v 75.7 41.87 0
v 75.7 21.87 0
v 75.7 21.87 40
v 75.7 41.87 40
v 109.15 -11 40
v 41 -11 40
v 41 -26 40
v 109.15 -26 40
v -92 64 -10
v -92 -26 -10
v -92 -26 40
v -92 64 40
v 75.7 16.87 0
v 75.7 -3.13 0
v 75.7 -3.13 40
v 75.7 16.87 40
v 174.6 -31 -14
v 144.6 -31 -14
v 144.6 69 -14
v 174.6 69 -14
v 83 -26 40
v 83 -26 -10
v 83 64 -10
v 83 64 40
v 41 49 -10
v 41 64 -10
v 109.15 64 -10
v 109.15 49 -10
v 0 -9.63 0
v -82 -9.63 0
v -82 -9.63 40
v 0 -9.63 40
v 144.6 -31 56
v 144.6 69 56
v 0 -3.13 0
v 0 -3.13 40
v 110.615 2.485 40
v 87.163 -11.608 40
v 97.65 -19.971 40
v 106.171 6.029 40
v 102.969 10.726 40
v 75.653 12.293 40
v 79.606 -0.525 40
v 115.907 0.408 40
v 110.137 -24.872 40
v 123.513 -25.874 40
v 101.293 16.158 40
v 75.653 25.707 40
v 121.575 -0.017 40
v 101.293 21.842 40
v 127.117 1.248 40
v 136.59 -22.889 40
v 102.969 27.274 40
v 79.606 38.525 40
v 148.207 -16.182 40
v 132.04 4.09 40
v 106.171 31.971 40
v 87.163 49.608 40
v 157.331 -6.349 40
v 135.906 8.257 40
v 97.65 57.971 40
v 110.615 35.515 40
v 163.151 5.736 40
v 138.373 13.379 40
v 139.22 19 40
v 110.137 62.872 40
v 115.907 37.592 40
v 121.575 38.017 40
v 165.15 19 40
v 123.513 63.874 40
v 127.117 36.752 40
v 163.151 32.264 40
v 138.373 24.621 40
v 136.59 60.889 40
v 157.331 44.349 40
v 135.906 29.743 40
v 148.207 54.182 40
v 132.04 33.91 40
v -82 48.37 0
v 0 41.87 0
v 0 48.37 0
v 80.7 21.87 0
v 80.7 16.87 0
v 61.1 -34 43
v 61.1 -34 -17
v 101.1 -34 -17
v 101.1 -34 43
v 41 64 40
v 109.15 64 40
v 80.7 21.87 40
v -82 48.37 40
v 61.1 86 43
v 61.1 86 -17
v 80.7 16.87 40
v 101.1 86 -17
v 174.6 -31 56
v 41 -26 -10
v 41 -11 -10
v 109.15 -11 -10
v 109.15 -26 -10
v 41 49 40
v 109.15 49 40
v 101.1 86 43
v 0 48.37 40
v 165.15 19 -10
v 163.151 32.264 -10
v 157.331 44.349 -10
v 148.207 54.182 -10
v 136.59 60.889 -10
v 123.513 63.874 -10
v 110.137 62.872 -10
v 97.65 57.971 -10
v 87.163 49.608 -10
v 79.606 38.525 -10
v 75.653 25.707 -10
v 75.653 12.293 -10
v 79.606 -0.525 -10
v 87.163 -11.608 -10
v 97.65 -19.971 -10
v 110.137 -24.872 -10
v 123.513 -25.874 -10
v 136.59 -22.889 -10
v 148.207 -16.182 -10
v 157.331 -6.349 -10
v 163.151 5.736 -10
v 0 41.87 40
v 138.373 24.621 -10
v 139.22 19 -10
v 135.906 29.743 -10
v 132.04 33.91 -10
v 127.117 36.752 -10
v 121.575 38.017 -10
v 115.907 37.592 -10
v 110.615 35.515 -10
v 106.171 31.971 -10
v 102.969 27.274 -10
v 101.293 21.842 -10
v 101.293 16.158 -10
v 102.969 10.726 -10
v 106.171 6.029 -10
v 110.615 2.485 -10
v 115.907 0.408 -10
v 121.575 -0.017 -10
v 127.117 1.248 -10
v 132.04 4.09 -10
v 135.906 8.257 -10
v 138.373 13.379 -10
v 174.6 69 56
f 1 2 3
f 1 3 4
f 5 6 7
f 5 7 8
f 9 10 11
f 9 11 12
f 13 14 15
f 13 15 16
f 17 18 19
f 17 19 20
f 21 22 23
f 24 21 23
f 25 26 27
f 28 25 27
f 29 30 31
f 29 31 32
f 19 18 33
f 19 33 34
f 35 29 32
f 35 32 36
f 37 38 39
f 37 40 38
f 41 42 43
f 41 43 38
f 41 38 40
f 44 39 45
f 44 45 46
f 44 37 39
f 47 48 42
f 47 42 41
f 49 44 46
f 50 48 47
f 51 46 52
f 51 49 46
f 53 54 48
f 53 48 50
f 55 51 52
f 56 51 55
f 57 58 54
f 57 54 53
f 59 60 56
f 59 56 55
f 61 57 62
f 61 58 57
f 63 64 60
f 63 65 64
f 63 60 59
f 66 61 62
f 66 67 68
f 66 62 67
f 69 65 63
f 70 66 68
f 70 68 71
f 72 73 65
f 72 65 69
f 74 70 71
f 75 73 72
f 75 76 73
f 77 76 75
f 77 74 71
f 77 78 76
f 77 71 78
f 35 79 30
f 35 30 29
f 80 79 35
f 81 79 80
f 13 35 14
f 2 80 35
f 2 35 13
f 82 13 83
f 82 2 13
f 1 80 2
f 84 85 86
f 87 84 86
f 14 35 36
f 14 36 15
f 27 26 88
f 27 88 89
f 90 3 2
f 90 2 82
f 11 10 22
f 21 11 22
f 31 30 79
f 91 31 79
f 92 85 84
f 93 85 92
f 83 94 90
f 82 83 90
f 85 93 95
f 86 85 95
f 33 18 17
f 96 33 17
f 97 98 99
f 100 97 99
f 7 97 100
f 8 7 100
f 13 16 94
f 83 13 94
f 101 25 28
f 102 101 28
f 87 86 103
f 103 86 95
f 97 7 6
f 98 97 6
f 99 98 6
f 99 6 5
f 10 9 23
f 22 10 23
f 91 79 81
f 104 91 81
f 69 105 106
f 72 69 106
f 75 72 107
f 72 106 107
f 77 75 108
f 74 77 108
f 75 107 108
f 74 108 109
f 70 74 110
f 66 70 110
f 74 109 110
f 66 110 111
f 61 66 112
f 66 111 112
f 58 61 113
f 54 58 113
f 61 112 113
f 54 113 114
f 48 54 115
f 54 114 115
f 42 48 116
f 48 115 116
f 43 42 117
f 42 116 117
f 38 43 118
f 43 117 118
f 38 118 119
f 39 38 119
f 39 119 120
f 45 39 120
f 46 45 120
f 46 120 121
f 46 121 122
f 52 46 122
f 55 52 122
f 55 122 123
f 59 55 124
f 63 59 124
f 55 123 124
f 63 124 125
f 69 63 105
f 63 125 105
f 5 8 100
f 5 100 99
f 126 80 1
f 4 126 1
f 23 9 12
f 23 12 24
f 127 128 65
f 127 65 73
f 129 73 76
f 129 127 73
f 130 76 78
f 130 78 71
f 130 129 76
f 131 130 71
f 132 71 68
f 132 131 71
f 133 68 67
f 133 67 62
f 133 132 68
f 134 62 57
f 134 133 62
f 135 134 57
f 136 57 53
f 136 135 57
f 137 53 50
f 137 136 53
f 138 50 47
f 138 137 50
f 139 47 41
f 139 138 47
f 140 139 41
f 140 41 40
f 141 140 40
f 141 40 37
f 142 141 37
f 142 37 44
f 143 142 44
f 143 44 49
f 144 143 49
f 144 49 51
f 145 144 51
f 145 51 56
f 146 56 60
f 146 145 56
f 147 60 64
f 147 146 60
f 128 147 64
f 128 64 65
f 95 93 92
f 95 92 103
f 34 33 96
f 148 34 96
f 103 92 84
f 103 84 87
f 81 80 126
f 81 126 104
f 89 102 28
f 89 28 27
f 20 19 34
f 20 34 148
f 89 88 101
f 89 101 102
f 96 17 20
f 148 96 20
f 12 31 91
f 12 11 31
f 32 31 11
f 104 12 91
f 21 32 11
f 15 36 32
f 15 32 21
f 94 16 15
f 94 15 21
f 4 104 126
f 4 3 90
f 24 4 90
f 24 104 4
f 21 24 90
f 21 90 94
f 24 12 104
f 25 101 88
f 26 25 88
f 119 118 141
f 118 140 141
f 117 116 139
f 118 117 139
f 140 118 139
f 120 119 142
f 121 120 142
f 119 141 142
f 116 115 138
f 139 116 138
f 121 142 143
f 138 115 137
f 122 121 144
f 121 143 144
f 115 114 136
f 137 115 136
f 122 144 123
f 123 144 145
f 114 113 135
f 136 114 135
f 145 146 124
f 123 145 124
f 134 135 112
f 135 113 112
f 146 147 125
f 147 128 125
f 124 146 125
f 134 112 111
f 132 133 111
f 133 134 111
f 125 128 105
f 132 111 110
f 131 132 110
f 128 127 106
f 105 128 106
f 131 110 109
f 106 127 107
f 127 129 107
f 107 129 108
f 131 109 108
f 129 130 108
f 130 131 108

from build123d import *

# Parameters (mm, degrees)
BOX004_W         = 68.15
BOX004_H         = 15
BOX004_DEPTH     = 50
BOX005_W         = 68.15
BOX005_H         = 15
BOX005_DEPTH     = 50
BOX006_W         = 40
BOX006_H         = 120
BOX006_DEPTH     = 60
BOX008_W         = 30
BOX008_H         = 100
BOX008_DEPTH     = 70
BOX001_W         = 82
BOX001_H         = 58
BOX001_DEPTH     = 44.4
BOX007_W         = 5
BOX007_H         = 5
BOX007_DEPTH     = 44.4
SKETCH001_R      = 5
EXTRUDE001_DEPTH = 4
EXTRUDE002_DEPTH = 15
SKETCH_R         = 12.3
EXTRUDE_DEPTH    = 5
BOX_W            = 75.7
BOX_H            = 45
BOX_DEPTH        = 44.4
BOX002_W         = 175
BOX002_H         = 90
BOX002_DEPTH     = 50
TUBE_R           = 45
TUBE_R_2         = 19.07
TUBE_DEPTH       = 50


with BuildPart() as cube004:
    # Box004 → Box004 (new body)
    with BuildSketch(Plane(origin=(41, -26, -10), x_dir=(1, 0, 0), z_dir=(0, 0, 1))):
        with Locations((34.075, 7.5)):
            Rectangle(BOX004_W, BOX004_H)
    extrude(amount=BOX004_DEPTH)


with BuildPart() as cube005:
    # Box005 → Box005 (new body)
    with BuildSketch(Plane(origin=(41, 49, -10), x_dir=(1, 0, 0), z_dir=(0, 0, 1))):
        with Locations((34.075, 7.5)):
            Rectangle(BOX005_W, BOX005_H)
    extrude(amount=BOX005_DEPTH)


with BuildPart() as roundoff:
    # Box006 → Box006 (new body)
    with BuildSketch(Plane(origin=(61.1, -34, -17), x_dir=(1, 0, 0), z_dir=(0, 0, 1))):
        with Locations((20, 60)):
            Rectangle(BOX006_W, BOX006_H)
    extrude(amount=BOX006_DEPTH)


with BuildPart() as steeringshaftcutter:
    # Box008 → Box008 (new body)
    with BuildSketch(Plane(origin=(144.6, -31, -14), x_dir=(1, 0, 0), z_dir=(0, 0, 1))):
        with Locations((15, 50)):
            Rectangle(BOX008_W, BOX008_H)
    extrude(amount=BOX008_DEPTH)


with BuildPart() as motorhead:
    # Box001 → Box001 (new body)
    with BuildSketch(Plane(origin=(-82, -9.63, 0), x_dir=(1, 0, 0), z_dir=(0, 0, 1))):
        with Locations((41, 29)):
            Rectangle(BOX001_W, BOX001_H)
    extrude(amount=BOX001_DEPTH)


with BuildPart() as nubchannel:
    # Box007 → Box007 (new body)
    with BuildSketch(Plane(origin=(75.7, 16.87, 0), x_dir=(1, 0, 0), z_dir=(0, 0, 1))):
        with Locations((2.5, 2.5)):
            Rectangle(BOX007_W, BOX007_H)
    extrude(amount=BOX007_DEPTH)


with BuildPart() as motorshaftfull:
    # Sketch001 (on Face3 of Extrude) → Extrude001 (new body)
    with BuildSketch(Plane.XY.offset(49.4)):
        with Locations((-58.7, 20.37)):
            Circle(SKETCH001_R)
    extrude(amount=EXTRUDE001_DEPTH)


with BuildPart() as motorshaftd:
    # Sketch002 (on Face3 of Extrude001) → Extrude002 (new body)
    with BuildSketch(Plane.XY.offset(53.4)):
        with BuildLine():
            Line((-62.7, 23.37), (-62.7, 17.37))
            ThreePointArc((-62.7, 17.37), (-53.7, 20.37), (-62.7, 23.37))
        make_face()
    extrude(amount=EXTRUDE002_DEPTH)


with BuildPart() as motorshaftassembly:
    # Sketch (on Face6 of Box001) → Extrude (new body)
    with BuildSketch(Plane(origin=(-82, -9.63, 44.4), x_dir=(1, 0, 0), z_dir=(0, 0, 1))):
        with Locations((23.3, 30)):
            Circle(SKETCH_R)
    extrude(amount=EXTRUDE_DEPTH)

    # Fusion: union MotorShaftFull, MotorShaftD
    add(motorshaftfull.part)
    add(motorshaftd.part)


with BuildPart() as motor:
    # Box → Box (new body)
    with BuildSketch(Plane(origin=(0, -3.13, 0), x_dir=(1, 0, 0), z_dir=(0, 0, 1))):
        with Locations((37.85, 22.5)):
            Rectangle(BOX_W, BOX_H)
    extrude(amount=BOX_DEPTH)

    # Fusion005: union MotorHead, NubChannel, MotorShaftAssembly
    add(motorhead.part)
    add(nubchannel.part)
    add(motorshaftassembly.part)


with BuildPart() as motorcast:
    # Box002 → Box002 (new body)
    with BuildSketch(Plane(origin=(-92, -26, -10), x_dir=(1, 0, 0), z_dir=(0, 0, 1))):
        with Locations((87.5, 45)):
            Rectangle(BOX002_W, BOX002_H)
    extrude(amount=BOX002_DEPTH)

    # Cut: cut Motor
    add(motor.part, mode=Mode.SUBTRACT)


with BuildPart() as steeringshaftmount:
    # Tube → Tube (new body)
    with BuildSketch(Plane(origin=(120.15, 19, -10), x_dir=(1, 0, 0), z_dir=(0, 0, 1))):
        Circle(TUBE_R)
        Circle(TUBE_R_2, mode=Mode.SUBTRACT)
    extrude(amount=TUBE_DEPTH)


solid = Compound([cube004.part, cube005.part, roundoff.part, steeringshaftcutter.part, motorcast.part, steeringshaftmount.part])
